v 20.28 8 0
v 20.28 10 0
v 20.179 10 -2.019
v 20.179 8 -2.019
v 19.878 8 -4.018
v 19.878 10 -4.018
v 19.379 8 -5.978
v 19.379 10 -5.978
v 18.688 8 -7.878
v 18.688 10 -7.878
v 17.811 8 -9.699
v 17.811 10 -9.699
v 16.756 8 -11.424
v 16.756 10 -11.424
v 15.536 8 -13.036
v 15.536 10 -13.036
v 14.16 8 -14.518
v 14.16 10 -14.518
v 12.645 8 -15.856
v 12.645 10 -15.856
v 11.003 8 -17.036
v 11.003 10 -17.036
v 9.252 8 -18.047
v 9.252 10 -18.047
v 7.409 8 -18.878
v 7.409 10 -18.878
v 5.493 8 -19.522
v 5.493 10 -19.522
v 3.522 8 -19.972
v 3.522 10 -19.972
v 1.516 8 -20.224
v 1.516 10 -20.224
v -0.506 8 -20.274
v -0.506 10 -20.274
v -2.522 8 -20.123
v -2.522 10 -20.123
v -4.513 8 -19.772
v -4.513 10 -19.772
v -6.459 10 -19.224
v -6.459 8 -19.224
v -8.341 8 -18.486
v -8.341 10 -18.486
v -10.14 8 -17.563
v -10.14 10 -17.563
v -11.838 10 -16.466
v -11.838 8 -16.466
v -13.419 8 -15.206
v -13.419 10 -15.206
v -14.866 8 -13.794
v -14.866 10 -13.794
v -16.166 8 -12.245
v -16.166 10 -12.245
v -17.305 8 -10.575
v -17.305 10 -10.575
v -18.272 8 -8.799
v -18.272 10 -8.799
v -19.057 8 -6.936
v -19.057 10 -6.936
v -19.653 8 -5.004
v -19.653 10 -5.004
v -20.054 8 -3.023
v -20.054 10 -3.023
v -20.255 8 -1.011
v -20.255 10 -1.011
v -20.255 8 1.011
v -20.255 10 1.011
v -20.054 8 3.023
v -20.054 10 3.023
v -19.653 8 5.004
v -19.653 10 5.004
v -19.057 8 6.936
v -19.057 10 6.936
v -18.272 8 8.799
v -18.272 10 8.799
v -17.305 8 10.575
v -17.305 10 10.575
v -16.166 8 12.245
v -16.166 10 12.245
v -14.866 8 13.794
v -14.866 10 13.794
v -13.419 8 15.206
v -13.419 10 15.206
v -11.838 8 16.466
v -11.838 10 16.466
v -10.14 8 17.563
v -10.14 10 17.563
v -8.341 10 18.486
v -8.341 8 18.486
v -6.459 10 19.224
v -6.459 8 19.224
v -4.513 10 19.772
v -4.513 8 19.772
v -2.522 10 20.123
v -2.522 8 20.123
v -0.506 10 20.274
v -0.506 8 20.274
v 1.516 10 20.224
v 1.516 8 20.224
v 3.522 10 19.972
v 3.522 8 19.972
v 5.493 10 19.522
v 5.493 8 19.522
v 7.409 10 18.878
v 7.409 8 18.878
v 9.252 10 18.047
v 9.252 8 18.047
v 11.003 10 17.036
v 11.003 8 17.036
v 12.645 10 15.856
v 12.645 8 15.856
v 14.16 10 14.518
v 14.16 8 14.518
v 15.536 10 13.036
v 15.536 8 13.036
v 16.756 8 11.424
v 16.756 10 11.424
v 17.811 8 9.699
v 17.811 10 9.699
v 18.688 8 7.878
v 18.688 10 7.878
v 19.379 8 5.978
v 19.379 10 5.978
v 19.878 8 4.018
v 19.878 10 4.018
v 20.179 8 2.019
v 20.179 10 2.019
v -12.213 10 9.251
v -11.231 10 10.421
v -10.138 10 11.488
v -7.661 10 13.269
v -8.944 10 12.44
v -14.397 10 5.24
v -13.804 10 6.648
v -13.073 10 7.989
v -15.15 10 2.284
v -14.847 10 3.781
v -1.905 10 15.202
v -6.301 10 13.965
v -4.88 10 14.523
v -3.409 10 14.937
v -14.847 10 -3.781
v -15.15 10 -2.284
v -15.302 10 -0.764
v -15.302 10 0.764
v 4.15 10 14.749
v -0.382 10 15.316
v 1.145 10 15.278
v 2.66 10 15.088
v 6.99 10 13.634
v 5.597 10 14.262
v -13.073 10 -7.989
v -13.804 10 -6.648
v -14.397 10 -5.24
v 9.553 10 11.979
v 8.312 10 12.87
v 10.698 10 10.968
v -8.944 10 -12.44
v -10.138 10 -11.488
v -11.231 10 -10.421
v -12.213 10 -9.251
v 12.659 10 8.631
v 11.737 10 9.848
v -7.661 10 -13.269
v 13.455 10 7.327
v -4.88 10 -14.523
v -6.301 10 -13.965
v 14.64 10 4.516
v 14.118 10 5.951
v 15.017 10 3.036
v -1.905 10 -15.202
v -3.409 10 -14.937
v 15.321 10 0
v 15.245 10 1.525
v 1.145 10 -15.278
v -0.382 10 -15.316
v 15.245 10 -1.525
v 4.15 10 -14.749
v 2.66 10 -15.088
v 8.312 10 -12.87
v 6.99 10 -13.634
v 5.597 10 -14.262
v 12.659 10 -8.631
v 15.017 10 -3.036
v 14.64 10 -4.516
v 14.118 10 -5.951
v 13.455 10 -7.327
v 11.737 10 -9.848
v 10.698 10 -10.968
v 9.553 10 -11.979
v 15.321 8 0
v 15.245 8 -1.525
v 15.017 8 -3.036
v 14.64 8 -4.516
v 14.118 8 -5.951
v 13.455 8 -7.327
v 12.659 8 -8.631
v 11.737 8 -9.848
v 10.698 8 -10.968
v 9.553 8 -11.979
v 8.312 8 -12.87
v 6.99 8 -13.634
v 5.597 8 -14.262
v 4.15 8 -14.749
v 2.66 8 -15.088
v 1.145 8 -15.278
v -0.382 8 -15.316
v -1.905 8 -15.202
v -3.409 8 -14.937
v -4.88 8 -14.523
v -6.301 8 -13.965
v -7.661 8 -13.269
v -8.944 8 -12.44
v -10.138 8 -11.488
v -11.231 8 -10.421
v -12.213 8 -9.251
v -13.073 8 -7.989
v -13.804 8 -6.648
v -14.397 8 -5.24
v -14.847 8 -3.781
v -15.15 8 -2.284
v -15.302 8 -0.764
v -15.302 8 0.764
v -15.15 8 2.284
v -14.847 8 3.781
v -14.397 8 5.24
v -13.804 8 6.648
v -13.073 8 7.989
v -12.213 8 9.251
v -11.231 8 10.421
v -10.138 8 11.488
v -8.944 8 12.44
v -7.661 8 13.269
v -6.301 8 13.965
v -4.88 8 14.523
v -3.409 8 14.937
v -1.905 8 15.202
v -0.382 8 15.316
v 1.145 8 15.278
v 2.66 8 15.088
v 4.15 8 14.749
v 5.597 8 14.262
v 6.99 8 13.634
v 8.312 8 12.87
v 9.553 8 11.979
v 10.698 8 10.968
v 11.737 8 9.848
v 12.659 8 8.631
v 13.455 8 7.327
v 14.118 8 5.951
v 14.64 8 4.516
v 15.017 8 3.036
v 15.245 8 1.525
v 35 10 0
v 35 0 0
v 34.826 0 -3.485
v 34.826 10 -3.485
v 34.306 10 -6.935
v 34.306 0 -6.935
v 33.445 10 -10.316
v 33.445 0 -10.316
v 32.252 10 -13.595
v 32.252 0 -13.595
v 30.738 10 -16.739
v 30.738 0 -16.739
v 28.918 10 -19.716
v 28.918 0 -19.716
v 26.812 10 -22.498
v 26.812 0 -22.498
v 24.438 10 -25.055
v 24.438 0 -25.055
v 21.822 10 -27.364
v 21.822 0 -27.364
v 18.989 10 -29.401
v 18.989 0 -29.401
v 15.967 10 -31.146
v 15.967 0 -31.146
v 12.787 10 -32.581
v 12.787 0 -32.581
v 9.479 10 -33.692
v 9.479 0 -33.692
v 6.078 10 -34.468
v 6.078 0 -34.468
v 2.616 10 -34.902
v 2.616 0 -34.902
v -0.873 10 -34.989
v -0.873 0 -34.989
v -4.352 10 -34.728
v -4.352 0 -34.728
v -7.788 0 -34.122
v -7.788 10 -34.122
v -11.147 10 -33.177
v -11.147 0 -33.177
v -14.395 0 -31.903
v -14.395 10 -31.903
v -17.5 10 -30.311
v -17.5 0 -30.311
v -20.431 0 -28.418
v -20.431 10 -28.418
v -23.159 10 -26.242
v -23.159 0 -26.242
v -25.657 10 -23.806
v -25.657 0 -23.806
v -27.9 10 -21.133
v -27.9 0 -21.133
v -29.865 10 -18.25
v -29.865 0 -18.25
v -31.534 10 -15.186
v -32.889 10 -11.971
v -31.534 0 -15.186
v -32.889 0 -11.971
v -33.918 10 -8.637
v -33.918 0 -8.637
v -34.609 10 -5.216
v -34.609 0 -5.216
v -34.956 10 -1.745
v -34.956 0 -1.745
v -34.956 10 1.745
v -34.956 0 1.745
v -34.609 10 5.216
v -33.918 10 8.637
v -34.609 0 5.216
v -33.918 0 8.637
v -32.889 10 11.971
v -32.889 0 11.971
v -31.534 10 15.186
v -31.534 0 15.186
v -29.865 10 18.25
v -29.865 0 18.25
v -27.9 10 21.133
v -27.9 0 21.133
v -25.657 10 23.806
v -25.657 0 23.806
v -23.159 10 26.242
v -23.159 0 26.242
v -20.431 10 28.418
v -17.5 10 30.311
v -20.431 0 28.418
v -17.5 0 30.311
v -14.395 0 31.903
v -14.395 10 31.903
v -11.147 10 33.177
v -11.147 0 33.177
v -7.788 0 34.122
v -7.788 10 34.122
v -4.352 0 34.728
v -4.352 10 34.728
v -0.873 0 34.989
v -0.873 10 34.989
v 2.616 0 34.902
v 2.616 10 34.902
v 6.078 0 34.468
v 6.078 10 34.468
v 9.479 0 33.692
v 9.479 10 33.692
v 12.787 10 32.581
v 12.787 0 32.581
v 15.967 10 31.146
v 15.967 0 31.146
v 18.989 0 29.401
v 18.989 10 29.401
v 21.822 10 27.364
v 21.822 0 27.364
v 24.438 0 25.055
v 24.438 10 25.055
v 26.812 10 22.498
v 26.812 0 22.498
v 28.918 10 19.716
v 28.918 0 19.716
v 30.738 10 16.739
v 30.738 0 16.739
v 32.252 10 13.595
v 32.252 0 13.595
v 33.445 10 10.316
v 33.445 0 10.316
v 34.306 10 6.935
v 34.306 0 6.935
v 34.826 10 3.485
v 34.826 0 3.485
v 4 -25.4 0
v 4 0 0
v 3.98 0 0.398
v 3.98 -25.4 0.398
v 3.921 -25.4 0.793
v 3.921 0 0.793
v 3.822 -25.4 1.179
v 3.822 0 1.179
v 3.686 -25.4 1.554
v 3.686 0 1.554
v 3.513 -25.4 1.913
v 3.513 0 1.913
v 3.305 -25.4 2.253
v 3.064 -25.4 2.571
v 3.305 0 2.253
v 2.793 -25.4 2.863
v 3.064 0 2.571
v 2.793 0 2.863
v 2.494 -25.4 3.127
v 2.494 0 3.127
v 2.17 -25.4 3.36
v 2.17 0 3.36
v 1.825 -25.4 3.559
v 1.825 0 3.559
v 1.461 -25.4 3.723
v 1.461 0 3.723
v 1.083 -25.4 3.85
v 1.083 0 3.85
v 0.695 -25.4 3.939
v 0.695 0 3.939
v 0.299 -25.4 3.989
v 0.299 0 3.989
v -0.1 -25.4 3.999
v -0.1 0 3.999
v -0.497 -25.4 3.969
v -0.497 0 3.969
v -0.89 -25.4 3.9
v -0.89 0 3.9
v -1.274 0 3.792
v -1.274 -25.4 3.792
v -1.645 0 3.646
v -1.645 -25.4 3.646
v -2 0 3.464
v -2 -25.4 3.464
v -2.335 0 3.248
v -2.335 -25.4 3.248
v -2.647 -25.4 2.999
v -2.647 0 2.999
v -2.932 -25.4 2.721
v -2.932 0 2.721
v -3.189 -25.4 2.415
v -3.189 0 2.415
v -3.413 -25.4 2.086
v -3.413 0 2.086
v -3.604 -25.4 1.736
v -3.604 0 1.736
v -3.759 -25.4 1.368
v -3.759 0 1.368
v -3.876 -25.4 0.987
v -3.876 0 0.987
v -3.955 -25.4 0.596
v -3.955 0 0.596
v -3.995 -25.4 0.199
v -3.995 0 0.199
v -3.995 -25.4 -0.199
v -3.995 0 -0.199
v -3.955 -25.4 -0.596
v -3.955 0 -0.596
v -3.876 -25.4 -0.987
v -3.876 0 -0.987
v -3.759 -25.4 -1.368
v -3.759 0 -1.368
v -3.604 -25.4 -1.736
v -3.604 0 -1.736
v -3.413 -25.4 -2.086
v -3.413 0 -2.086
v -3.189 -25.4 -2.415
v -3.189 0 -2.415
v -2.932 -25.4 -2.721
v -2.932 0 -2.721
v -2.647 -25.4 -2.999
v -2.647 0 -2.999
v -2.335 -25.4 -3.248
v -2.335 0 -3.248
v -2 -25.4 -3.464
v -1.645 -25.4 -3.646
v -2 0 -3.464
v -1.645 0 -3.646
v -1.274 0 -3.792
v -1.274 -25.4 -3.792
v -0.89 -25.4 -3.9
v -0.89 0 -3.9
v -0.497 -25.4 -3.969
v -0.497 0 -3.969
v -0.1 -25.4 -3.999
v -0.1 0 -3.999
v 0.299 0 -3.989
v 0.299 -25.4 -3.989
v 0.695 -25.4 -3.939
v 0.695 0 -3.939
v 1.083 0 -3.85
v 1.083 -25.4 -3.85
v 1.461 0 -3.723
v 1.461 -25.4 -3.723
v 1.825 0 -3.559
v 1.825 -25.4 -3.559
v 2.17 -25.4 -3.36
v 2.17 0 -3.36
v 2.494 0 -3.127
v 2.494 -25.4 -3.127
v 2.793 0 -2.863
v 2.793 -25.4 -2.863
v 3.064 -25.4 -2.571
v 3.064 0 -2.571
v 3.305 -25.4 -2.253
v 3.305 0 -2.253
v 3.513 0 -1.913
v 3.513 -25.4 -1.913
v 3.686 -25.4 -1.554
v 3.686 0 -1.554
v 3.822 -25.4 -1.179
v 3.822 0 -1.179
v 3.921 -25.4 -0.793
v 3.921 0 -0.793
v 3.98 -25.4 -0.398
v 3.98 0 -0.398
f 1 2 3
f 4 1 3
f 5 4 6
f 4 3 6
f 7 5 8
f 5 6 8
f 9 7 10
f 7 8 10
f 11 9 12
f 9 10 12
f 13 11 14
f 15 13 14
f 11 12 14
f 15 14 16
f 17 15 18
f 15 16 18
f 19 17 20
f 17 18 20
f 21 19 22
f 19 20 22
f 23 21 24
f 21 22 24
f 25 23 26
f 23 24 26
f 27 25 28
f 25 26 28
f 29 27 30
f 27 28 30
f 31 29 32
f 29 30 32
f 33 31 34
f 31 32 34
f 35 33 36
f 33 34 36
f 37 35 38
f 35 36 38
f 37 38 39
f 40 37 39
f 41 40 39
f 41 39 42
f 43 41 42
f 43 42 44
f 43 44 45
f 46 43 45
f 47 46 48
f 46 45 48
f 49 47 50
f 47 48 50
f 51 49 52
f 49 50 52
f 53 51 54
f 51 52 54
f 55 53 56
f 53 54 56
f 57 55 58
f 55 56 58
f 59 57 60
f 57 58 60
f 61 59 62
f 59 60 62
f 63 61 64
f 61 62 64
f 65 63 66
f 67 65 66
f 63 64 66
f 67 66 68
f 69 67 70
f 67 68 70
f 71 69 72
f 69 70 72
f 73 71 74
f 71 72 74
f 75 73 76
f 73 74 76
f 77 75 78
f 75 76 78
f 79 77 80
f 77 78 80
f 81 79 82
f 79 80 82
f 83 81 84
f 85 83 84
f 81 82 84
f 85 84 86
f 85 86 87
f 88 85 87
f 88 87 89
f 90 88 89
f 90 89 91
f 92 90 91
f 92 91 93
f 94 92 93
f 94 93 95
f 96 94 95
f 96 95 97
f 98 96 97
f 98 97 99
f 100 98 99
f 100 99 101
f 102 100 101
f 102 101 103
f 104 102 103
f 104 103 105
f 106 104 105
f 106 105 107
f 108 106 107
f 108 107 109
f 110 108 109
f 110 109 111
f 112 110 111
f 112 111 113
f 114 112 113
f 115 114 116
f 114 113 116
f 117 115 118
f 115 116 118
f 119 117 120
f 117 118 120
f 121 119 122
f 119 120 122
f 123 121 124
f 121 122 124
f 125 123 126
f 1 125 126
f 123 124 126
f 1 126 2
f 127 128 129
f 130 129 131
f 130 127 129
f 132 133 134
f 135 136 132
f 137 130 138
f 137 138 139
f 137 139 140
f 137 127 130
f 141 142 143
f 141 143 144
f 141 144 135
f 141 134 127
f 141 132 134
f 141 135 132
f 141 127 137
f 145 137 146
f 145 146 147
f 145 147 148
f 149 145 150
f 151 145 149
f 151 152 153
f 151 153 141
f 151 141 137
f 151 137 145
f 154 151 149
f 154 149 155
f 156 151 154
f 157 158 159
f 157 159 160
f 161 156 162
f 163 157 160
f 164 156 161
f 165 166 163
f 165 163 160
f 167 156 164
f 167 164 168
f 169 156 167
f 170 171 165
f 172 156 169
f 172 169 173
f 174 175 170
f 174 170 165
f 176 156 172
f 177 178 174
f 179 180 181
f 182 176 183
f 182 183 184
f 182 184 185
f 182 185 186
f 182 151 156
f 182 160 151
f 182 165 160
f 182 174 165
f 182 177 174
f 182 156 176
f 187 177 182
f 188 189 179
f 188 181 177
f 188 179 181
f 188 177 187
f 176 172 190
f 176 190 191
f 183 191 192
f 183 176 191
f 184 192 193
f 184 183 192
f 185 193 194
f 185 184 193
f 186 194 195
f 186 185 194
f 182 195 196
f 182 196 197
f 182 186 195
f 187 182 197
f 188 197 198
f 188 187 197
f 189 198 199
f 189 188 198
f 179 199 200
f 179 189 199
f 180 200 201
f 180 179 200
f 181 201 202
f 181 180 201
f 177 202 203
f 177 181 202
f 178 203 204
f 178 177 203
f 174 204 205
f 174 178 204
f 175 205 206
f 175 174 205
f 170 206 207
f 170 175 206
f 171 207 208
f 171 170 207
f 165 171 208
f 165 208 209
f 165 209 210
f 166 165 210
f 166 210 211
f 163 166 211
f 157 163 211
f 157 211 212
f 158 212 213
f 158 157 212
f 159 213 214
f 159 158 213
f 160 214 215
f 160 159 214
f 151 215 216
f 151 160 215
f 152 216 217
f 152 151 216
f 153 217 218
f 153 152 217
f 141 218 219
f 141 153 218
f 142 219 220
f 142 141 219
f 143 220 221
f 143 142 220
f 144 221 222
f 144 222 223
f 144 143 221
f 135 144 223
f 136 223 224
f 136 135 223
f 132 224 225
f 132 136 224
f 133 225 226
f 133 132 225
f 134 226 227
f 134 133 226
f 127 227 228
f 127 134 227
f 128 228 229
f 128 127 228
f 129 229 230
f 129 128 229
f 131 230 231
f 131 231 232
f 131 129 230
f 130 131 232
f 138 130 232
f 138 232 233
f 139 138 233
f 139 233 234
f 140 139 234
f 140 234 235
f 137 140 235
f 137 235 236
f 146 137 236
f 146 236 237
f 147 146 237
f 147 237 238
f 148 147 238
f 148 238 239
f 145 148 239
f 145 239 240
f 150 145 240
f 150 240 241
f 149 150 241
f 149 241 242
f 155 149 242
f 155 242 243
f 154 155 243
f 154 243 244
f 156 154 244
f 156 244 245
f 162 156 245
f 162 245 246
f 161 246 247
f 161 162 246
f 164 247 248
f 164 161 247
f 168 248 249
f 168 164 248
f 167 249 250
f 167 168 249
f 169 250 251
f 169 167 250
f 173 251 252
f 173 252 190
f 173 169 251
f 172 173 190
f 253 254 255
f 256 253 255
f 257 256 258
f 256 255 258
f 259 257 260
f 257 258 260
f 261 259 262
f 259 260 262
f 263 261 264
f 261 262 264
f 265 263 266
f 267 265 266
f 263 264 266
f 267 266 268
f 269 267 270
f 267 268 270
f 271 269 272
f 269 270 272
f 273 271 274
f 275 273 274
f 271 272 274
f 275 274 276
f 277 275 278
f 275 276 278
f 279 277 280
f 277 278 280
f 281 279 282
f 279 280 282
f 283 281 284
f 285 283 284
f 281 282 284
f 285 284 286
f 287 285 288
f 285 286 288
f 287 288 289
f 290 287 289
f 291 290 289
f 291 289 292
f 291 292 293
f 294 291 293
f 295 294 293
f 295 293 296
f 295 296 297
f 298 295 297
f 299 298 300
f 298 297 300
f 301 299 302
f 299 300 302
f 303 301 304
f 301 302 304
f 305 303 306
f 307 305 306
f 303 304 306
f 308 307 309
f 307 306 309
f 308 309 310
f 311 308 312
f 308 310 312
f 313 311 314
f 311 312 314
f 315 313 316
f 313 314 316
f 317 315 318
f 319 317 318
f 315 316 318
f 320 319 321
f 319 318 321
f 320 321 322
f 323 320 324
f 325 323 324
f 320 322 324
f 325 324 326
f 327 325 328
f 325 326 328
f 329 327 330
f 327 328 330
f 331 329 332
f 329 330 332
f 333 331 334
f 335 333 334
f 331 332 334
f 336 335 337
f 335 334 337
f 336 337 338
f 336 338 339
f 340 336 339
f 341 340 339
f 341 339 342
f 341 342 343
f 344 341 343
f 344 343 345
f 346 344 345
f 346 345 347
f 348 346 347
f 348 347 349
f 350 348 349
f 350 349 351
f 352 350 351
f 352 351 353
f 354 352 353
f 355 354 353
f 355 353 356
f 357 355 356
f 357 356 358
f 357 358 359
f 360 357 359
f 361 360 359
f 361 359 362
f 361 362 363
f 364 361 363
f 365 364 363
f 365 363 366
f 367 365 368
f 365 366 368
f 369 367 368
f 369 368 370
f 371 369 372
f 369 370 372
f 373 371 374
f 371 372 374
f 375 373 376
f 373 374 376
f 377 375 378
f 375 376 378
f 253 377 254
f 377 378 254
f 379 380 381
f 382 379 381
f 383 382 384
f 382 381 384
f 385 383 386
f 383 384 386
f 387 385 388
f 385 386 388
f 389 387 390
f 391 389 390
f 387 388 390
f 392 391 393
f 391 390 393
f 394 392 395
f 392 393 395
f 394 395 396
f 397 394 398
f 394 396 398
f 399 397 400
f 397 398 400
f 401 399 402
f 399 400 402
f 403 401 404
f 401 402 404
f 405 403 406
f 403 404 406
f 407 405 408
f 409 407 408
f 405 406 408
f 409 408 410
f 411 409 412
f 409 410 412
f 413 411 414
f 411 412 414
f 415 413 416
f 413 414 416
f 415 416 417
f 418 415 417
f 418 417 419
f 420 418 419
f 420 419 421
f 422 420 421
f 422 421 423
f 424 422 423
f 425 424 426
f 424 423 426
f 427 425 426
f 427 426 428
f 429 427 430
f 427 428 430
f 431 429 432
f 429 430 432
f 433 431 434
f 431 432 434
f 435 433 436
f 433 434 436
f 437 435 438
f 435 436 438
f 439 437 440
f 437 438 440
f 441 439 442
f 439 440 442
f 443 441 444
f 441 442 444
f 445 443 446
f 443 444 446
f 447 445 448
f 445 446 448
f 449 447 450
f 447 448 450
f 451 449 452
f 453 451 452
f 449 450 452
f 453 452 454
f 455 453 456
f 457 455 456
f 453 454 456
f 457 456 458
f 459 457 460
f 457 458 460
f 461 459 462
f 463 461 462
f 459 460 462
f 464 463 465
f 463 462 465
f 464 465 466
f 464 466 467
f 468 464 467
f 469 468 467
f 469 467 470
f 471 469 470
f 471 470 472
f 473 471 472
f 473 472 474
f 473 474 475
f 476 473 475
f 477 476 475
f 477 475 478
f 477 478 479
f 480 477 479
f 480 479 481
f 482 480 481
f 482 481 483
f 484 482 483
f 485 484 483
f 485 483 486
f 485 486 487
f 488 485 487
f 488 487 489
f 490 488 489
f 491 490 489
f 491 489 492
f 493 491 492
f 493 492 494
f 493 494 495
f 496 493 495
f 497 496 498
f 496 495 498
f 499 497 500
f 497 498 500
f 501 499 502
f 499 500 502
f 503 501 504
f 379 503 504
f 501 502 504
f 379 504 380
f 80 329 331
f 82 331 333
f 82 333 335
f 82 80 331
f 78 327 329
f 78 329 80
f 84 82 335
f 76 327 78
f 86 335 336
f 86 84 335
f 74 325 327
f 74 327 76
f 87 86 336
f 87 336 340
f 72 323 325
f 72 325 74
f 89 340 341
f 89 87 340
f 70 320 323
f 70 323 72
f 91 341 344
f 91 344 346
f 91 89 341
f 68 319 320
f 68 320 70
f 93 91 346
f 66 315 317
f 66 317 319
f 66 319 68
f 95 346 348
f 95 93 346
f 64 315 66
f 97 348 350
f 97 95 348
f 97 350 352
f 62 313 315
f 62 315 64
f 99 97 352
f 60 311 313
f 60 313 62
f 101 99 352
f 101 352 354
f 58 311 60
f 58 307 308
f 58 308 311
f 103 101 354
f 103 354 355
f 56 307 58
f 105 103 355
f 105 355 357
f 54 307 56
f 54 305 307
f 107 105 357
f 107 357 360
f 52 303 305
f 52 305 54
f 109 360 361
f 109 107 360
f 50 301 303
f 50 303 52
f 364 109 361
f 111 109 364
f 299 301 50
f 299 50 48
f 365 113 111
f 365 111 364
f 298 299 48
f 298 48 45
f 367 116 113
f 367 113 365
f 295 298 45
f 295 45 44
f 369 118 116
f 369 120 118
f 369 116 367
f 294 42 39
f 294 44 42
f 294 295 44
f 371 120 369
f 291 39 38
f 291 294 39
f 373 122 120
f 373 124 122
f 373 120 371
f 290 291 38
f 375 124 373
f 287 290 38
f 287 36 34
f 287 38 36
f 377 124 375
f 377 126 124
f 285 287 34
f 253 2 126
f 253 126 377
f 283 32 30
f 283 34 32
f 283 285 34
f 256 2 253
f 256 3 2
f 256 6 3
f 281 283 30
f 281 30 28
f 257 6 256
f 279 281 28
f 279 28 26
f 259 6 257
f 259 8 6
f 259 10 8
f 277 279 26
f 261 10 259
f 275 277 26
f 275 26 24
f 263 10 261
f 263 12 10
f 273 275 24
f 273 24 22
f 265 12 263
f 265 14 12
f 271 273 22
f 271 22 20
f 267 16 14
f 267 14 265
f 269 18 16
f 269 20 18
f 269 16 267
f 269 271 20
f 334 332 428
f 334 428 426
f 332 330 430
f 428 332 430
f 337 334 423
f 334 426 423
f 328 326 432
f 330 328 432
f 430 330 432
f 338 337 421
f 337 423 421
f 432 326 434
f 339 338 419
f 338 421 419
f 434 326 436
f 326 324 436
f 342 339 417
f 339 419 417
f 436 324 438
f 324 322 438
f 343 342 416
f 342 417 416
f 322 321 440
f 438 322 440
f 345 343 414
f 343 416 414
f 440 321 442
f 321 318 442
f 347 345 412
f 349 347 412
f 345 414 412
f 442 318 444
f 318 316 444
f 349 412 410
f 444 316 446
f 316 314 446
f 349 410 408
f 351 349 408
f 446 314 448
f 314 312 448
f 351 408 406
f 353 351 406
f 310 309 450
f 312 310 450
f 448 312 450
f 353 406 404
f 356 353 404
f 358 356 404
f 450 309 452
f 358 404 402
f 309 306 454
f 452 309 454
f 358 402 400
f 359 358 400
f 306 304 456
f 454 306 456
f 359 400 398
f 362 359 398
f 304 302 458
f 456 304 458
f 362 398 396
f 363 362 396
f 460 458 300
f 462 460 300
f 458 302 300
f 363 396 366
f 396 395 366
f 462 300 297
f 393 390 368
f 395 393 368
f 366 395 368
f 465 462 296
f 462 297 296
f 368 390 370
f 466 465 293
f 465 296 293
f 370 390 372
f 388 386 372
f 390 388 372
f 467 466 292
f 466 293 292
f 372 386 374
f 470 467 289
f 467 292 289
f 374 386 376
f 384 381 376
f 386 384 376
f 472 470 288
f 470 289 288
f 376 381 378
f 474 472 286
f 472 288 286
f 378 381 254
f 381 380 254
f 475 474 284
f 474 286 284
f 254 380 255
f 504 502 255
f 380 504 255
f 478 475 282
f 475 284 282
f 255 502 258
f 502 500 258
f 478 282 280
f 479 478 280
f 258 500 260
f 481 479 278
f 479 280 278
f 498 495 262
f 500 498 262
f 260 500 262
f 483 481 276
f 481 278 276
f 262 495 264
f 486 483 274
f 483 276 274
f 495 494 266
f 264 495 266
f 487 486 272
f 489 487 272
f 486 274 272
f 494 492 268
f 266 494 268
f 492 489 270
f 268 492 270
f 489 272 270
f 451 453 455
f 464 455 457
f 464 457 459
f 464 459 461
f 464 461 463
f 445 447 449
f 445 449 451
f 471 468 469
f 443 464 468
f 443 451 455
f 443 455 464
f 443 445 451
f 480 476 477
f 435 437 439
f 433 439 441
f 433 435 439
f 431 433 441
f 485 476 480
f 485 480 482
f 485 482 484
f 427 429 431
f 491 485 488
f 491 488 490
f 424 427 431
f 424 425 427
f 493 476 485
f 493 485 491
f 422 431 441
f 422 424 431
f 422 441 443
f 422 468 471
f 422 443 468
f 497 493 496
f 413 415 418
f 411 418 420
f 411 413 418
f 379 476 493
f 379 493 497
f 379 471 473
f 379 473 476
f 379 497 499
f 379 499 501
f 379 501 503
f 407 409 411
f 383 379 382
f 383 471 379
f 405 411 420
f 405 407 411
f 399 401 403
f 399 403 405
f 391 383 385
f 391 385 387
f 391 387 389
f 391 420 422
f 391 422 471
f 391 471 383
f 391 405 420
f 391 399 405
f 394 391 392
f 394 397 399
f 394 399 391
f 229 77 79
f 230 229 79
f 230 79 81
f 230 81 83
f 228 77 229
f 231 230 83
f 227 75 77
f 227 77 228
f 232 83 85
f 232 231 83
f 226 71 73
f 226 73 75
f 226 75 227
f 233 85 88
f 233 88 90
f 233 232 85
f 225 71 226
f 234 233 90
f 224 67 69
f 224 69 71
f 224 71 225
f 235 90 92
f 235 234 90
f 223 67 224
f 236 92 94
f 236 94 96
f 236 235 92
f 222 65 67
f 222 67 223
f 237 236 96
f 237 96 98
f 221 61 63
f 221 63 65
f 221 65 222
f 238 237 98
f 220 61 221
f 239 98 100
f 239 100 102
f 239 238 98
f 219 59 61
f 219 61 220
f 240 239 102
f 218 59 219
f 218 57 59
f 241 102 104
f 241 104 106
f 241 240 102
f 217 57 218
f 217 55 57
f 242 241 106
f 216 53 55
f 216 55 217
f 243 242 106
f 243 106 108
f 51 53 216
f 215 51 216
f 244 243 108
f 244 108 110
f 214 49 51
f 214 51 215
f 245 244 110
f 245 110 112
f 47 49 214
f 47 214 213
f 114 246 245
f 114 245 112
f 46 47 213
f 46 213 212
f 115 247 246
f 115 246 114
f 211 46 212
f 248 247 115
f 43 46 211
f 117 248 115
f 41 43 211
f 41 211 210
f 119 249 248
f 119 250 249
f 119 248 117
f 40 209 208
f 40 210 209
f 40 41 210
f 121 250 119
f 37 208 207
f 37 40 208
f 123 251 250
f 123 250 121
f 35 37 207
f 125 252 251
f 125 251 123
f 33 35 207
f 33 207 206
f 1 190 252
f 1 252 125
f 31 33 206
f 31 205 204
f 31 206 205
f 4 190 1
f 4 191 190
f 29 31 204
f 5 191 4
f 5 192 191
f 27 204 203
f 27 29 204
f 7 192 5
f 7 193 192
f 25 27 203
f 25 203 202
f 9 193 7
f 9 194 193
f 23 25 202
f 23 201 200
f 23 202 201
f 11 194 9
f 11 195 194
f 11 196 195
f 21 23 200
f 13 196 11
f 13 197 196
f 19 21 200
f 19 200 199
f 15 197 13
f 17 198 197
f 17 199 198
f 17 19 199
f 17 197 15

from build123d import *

# Parameters (mm, degrees)
SKETCH1_R           = 35
BOSS_EXTRUDE1_DEPTH = 10
SKETCH2_R           = 20.280215245
SKETCH2_R_2         = 15.321162536
CUT_EXTRUDE1_DEPTH  = 2
SKETCH3_R           = 4
BOSS_EXTRUDE2_DEPTH = 25.4


with BuildPart() as part:
    # Sketch1 → Boss-Extrude1 (new body)
    with BuildSketch(Plane(origin=(0, 0, 0), x_dir=(1, 0, 0), z_dir=(0, 1, 0))):
        Circle(SKETCH1_R)
    extrude(amount=BOSS_EXTRUDE1_DEPTH)

    # Sketch2 → Cut-Extrude1 (cut)
    with BuildSketch(Plane(origin=(0, 10, 0), x_dir=(1, 0, 0), z_dir=(0, 1, 0))):
        Circle(SKETCH2_R)
        Circle(SKETCH2_R_2, mode=Mode.SUBTRACT)
    extrude(amount=-CUT_EXTRUDE1_DEPTH, mode=Mode.SUBTRACT)

    # Sketch3 → Boss-Extrude2 (add)
    with BuildSketch(Plane.XZ):
        Circle(SKETCH3_R)
    extrude(amount=BOSS_EXTRUDE2_DEPTH)


solid = part.part
